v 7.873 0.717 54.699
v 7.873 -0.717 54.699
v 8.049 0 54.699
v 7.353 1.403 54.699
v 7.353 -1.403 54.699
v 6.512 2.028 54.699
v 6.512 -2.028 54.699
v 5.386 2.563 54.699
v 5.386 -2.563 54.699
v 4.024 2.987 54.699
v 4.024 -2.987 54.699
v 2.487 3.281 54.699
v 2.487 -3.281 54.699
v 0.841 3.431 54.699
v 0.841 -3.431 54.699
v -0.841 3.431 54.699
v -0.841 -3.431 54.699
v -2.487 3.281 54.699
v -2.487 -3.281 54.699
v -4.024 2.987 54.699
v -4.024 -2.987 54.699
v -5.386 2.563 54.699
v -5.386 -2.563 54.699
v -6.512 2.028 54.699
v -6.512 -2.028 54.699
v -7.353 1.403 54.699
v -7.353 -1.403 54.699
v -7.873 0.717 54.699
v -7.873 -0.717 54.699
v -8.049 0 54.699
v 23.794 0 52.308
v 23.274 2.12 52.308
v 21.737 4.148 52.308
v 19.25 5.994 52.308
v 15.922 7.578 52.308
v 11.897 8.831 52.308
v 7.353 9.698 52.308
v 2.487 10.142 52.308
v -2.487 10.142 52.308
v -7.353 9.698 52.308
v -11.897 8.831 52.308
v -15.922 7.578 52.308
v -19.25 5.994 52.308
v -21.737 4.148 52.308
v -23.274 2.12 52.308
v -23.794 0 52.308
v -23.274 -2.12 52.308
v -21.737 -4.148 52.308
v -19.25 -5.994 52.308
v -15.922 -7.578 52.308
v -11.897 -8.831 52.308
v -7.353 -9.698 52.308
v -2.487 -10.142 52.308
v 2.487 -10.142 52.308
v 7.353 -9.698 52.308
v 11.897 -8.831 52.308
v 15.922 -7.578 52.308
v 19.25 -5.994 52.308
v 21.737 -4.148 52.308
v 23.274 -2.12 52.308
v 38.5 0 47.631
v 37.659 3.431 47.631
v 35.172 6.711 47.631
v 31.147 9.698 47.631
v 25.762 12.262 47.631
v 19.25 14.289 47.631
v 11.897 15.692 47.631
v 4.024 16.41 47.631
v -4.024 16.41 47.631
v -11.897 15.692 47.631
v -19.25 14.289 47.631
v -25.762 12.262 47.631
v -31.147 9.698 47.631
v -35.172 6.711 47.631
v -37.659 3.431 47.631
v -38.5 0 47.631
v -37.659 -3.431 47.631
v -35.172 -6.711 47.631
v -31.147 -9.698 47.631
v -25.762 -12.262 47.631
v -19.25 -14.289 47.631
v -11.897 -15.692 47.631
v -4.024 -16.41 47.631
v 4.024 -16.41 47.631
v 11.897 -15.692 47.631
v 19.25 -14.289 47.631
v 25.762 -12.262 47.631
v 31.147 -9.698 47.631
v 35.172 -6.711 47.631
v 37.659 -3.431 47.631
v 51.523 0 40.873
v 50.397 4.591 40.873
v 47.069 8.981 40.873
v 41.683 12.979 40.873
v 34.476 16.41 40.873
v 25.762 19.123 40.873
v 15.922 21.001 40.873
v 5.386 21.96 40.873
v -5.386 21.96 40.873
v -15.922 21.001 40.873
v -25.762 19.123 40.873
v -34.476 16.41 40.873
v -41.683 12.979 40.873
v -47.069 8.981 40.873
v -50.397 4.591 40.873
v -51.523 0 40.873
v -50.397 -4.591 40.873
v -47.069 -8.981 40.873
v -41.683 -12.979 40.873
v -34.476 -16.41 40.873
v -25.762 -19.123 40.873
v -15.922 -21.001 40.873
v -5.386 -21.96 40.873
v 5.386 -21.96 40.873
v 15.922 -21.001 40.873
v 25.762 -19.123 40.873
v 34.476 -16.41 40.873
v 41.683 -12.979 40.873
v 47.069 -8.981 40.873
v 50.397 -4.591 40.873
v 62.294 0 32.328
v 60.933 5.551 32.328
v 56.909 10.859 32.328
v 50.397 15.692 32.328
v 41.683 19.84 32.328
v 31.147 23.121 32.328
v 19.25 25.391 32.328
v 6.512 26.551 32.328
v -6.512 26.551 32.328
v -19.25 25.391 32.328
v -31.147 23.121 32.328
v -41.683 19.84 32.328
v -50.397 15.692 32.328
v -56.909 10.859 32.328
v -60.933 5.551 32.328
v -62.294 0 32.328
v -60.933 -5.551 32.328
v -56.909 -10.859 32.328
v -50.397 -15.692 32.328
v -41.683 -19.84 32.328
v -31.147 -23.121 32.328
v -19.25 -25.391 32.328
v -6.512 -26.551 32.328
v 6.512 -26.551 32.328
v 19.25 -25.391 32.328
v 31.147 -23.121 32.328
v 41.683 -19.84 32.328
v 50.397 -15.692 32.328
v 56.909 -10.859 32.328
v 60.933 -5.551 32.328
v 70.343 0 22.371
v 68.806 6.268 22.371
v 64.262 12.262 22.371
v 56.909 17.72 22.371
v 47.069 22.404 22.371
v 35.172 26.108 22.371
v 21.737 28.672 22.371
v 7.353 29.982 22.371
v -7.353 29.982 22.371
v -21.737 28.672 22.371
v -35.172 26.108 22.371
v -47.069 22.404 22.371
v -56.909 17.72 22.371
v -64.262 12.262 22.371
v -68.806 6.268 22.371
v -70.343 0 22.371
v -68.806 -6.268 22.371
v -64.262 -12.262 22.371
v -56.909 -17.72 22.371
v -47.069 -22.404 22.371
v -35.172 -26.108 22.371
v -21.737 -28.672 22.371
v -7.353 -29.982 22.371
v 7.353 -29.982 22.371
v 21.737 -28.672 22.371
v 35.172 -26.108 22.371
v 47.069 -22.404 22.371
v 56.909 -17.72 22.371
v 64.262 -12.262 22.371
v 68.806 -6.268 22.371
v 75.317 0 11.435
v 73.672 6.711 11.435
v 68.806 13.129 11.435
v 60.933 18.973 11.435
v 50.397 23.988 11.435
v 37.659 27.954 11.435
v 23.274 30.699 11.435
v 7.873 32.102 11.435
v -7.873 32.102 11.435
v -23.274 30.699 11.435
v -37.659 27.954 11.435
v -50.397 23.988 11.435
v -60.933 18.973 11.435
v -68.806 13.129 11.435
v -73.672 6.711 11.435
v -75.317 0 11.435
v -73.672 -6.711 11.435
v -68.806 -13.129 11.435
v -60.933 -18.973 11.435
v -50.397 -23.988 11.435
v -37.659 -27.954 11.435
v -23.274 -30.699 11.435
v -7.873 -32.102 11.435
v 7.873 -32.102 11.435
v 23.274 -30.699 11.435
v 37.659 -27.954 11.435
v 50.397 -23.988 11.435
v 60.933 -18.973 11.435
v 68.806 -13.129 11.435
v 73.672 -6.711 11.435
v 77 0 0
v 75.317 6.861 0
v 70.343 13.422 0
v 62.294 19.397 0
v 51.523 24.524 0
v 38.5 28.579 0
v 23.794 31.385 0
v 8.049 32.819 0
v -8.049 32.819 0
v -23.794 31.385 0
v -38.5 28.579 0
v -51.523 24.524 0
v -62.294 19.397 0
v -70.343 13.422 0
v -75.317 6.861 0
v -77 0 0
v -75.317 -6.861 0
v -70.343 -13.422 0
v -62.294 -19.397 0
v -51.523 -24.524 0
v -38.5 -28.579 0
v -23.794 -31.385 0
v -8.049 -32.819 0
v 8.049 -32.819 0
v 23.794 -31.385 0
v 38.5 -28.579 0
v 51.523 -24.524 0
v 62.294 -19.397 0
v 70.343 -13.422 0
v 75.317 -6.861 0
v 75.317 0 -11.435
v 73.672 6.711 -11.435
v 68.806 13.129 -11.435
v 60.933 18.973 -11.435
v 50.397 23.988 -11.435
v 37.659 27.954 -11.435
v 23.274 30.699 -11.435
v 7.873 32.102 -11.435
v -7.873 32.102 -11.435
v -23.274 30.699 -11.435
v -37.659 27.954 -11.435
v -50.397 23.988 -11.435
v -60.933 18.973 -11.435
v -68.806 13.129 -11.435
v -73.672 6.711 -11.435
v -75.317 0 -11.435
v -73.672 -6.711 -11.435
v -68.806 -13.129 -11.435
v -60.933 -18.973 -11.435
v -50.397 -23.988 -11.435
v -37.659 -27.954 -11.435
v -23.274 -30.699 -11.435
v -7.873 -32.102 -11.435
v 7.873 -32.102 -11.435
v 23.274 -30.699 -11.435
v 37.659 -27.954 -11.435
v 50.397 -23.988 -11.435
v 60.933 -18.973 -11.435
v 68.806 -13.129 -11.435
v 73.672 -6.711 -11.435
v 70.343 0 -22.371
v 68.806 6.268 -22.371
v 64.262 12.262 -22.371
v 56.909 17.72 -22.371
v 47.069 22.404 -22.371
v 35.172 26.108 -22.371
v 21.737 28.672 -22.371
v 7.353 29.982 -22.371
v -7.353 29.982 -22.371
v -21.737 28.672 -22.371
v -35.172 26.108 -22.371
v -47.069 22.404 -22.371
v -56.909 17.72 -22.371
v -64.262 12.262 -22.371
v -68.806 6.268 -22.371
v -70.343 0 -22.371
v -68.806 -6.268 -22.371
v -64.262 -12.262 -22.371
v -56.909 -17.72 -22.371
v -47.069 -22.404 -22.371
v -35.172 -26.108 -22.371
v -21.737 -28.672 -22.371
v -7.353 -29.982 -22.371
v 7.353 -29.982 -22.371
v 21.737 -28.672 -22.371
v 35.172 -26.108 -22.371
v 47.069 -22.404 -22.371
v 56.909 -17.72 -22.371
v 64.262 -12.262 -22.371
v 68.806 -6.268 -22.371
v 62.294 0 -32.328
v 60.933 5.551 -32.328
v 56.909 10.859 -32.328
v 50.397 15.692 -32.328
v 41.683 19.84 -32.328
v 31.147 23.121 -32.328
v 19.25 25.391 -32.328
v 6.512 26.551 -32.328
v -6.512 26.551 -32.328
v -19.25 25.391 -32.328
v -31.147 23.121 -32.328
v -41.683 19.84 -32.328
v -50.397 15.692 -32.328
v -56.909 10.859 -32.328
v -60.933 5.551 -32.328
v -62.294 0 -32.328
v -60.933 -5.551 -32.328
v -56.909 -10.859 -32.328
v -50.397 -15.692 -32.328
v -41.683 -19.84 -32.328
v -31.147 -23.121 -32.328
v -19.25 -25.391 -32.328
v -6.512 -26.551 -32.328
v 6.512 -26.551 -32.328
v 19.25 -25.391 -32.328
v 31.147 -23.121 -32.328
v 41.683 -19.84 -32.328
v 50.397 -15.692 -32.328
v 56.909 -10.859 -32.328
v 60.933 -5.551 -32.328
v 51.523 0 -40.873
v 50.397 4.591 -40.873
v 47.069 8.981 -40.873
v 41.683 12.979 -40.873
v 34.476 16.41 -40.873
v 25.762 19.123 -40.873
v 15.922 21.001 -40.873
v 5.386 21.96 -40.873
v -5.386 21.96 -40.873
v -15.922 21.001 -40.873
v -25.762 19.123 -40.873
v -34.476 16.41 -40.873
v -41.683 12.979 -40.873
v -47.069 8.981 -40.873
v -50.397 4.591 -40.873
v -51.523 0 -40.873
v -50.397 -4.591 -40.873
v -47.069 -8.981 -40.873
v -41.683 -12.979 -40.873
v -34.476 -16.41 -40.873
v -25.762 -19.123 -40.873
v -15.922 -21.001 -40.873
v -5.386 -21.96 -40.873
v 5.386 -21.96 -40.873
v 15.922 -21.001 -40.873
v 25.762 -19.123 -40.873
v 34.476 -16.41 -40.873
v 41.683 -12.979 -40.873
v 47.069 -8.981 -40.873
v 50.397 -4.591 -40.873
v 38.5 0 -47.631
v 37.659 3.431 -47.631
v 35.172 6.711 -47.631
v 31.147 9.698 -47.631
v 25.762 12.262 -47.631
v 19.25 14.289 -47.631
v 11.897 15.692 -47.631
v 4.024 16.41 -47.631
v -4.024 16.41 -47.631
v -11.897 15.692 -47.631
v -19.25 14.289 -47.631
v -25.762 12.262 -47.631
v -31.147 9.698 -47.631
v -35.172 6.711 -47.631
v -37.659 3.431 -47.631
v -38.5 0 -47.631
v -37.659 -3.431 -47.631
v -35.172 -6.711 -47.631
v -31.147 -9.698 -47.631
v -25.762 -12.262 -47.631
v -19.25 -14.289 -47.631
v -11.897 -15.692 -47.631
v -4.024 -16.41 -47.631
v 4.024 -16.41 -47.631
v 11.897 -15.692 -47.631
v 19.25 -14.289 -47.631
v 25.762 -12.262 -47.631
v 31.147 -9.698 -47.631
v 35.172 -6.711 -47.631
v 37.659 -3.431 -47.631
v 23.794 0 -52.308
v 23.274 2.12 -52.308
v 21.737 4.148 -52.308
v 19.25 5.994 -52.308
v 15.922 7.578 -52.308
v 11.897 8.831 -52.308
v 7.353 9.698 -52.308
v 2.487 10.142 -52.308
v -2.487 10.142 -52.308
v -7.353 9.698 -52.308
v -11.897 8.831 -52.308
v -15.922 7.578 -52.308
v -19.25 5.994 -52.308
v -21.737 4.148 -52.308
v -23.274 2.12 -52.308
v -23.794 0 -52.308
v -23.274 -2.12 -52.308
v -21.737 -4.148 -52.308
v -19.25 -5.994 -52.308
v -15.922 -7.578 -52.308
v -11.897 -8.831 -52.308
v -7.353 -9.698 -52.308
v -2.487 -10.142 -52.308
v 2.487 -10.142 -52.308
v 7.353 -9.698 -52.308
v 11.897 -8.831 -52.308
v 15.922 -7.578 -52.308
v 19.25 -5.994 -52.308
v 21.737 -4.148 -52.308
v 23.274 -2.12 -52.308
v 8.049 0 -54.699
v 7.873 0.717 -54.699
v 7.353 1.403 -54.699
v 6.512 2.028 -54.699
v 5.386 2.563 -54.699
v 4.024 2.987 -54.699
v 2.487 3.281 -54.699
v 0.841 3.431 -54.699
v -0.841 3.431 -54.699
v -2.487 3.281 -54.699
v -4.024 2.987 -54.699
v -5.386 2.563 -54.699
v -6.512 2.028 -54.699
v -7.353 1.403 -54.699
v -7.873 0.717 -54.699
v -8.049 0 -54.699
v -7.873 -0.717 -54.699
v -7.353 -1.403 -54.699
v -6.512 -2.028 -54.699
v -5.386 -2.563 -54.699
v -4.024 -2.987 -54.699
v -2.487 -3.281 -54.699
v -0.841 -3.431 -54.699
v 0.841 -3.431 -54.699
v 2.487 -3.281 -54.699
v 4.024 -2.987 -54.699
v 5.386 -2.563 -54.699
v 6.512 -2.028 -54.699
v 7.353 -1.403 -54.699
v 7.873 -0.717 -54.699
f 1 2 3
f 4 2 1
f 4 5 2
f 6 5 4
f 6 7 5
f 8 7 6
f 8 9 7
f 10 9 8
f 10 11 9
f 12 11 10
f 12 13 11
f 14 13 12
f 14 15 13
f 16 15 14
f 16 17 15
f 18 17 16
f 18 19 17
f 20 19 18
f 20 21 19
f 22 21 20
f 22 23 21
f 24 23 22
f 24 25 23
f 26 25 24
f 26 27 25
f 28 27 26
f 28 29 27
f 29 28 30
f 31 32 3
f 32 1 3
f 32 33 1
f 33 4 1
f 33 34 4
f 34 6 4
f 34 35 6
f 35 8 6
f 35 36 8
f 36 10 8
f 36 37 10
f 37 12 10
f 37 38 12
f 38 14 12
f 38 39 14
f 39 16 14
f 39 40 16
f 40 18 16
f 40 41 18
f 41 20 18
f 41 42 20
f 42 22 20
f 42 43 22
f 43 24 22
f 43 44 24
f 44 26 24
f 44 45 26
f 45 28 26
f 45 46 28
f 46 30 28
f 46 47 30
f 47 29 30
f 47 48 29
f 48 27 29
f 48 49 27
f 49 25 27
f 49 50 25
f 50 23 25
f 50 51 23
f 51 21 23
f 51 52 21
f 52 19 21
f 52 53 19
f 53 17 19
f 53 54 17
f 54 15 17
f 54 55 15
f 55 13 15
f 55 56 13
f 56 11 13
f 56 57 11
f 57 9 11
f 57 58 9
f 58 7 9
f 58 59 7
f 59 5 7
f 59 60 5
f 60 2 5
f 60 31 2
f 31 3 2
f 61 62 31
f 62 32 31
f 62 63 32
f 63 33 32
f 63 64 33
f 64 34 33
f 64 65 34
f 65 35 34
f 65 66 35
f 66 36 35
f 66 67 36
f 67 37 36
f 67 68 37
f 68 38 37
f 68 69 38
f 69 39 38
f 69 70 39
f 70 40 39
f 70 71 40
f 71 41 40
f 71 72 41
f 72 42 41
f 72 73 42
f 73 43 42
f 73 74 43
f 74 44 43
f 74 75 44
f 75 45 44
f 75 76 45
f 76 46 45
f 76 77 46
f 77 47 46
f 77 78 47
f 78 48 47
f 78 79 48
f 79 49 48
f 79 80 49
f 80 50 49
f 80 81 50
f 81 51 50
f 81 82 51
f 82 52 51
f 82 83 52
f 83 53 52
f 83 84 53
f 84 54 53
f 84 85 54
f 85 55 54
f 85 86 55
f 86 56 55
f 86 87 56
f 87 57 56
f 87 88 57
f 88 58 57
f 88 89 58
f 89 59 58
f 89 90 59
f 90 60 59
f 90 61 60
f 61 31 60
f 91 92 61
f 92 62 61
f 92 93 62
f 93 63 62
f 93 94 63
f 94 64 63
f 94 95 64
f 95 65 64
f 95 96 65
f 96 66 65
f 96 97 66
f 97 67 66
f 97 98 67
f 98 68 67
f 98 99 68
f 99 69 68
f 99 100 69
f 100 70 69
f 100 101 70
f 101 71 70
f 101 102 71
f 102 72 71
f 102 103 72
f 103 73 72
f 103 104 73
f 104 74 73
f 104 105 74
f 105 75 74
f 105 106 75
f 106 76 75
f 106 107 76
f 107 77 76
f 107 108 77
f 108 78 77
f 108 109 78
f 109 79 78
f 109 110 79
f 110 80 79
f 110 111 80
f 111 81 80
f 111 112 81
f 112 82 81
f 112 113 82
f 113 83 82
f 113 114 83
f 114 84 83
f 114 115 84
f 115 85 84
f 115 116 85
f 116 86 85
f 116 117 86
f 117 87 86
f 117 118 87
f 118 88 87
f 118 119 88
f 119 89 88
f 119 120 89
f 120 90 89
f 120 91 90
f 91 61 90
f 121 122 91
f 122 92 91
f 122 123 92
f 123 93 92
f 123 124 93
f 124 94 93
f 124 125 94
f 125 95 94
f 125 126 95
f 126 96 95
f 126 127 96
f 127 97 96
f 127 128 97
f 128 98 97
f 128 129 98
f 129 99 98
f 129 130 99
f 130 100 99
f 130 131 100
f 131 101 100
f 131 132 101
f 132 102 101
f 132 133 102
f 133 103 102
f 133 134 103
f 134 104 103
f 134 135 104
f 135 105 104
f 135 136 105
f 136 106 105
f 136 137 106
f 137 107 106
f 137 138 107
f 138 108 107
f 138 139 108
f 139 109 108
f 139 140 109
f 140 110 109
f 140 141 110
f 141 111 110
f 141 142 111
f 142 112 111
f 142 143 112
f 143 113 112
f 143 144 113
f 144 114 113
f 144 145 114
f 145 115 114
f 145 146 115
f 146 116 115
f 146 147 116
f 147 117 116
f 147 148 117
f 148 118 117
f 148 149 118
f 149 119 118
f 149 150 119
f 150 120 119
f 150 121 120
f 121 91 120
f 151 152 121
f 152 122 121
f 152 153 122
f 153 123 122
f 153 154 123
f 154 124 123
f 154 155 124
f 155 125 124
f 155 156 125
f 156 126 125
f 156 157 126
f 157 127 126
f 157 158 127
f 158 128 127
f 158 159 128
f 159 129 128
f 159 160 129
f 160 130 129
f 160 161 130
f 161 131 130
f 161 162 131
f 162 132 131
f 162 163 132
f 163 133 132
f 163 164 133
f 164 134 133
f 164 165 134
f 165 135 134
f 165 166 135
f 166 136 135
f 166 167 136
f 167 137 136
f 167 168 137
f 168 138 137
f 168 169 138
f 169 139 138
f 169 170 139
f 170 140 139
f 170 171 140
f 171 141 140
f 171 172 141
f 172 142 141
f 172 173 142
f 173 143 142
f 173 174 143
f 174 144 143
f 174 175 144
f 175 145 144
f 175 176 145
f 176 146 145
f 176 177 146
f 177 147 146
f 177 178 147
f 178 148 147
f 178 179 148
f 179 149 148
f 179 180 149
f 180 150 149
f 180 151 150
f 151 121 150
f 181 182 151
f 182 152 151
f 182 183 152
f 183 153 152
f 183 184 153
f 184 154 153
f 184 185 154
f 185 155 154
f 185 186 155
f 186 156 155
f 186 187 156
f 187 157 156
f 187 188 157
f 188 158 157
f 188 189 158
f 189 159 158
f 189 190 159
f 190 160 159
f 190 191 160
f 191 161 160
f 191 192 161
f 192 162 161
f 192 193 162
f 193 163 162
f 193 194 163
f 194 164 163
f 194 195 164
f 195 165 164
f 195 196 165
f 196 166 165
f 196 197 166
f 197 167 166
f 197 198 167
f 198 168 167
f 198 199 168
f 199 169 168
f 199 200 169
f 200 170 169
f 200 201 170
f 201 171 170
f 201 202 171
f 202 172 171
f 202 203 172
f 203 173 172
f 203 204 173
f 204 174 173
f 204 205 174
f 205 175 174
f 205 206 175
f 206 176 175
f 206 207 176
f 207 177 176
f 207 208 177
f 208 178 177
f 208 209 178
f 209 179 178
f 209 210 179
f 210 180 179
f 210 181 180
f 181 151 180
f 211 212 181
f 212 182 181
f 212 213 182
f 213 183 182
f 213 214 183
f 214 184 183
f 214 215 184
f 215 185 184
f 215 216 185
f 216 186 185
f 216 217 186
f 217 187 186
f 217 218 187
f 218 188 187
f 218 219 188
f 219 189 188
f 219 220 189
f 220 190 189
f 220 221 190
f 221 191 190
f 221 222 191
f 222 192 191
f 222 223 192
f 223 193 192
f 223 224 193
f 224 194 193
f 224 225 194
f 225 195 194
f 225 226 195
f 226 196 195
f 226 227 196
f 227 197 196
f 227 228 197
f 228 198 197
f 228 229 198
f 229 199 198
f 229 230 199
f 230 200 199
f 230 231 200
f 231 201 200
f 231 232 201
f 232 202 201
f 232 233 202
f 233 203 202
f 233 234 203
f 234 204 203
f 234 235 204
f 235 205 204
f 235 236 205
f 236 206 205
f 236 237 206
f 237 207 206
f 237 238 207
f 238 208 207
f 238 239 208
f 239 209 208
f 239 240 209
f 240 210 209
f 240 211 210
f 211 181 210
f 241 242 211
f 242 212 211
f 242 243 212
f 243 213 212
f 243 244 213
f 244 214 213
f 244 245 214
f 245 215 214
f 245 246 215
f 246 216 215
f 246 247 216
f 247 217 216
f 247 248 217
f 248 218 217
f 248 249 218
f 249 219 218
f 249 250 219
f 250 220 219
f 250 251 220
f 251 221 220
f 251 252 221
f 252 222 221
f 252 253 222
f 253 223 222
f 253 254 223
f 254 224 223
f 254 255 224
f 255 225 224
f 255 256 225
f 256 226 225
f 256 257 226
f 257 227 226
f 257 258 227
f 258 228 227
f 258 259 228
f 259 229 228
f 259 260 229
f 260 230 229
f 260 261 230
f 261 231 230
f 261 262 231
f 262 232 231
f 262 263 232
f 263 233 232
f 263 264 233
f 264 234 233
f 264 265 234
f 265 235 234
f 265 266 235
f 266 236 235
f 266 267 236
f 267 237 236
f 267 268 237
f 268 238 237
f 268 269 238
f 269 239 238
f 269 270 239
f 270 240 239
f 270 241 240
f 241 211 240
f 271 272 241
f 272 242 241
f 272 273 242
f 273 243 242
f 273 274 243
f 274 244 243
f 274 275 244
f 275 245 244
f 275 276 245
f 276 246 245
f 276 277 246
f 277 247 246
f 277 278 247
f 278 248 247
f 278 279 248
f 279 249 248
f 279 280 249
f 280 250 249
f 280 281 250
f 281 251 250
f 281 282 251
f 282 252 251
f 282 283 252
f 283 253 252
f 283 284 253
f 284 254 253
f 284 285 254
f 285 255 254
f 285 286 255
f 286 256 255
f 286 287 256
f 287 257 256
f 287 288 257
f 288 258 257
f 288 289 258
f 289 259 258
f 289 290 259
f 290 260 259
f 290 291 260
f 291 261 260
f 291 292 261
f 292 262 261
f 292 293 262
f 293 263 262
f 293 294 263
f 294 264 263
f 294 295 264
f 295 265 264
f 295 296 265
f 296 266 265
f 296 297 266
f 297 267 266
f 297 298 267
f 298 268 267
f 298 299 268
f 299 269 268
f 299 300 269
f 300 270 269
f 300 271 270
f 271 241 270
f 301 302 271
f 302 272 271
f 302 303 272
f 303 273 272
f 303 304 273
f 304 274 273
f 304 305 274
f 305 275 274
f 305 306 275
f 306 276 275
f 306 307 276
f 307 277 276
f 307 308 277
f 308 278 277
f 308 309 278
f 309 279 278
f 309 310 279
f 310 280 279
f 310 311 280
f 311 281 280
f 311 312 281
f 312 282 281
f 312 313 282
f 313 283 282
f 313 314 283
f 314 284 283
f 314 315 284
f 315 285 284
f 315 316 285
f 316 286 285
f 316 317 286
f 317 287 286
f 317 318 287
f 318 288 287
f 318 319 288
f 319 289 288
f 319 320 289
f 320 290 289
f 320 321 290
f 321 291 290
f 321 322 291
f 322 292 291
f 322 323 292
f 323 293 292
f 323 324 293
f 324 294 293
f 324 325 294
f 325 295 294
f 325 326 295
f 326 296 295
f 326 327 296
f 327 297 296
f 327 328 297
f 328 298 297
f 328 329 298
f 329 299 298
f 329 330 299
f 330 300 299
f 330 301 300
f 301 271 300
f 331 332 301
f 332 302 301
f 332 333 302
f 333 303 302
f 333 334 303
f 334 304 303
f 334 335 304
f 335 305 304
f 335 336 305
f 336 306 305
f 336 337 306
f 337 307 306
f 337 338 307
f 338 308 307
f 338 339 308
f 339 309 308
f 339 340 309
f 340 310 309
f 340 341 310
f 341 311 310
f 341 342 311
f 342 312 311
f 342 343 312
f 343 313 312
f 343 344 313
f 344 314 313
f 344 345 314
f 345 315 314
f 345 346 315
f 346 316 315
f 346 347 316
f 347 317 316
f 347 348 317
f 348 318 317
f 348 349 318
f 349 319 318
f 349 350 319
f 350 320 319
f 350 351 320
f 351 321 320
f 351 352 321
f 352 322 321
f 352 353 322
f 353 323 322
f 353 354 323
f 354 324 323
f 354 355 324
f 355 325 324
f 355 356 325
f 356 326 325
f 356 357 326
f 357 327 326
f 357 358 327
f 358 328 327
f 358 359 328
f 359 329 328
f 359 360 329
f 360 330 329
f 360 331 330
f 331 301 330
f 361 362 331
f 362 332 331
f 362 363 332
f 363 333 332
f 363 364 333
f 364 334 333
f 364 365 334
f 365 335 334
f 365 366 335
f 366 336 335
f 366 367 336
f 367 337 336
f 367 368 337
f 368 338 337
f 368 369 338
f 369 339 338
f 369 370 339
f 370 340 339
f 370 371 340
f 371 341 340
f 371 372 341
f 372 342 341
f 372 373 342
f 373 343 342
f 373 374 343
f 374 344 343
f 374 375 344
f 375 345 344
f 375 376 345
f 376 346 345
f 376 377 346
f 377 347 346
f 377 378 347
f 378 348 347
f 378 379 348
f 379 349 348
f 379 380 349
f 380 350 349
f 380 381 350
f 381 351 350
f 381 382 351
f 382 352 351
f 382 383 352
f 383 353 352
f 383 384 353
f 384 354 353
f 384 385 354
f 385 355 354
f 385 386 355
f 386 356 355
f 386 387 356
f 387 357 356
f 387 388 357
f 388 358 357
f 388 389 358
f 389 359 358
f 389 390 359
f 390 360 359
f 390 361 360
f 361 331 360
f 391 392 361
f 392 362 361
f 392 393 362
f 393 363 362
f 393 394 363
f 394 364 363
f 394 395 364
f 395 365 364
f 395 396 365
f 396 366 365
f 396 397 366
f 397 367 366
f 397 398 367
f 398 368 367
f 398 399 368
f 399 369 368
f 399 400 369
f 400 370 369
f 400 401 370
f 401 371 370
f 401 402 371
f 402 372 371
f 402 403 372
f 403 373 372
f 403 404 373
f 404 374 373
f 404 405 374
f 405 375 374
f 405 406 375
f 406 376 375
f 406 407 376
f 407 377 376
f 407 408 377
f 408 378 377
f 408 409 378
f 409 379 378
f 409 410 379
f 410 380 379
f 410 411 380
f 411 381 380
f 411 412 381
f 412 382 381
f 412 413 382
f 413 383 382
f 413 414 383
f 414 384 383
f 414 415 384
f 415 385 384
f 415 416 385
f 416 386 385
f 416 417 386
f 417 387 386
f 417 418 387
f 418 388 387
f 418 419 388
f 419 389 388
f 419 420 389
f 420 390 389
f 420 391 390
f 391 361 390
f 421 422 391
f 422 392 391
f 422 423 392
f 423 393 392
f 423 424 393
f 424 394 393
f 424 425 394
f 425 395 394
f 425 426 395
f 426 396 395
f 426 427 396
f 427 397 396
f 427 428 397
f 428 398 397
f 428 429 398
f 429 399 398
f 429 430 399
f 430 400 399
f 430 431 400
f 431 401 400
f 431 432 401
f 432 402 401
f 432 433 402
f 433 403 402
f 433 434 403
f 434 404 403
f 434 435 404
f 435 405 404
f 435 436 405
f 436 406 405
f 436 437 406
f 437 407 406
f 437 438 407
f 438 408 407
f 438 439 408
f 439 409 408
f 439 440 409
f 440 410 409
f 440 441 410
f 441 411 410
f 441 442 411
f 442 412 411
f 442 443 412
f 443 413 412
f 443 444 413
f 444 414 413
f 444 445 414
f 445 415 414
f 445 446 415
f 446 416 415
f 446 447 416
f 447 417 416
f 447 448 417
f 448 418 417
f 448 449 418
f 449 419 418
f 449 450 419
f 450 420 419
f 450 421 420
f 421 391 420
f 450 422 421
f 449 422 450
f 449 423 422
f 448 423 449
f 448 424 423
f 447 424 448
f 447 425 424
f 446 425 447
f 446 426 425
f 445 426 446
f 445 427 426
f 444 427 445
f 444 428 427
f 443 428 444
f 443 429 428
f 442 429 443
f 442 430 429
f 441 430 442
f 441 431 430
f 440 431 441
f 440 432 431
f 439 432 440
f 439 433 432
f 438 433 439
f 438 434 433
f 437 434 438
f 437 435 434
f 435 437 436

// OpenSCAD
// Generated by SolidPython 1.0.1 on 2020-07-29 00:46:47


scale(v = [7, 3, 5]) {
	sphere(r = 11);
}
/***********************************************
*********      SolidPython code:      **********
************************************************
 
# import packages: SolidPython
from solid import *
from solid.utils import *
from itertools import chain, combinations, permutations


class Resize:

    def __init__(self, scad_file):
        self.scad_file = scad_file
        #self.scad_file = import_scad(scad_file)
        # cone/cylinder param:
        self.r1 = 0
        self.r2 = 0
        self.h = 0
        # rectangular prism param:
        self.w = 0
        self.l = 0
        # ellipse param:
        self.r = 0

    # import OpenScad code (file name corresponds to shape)


    # classify shape + parameters
    def assign(self, param1, param2, param3):
        if self.scad_file == 'cone.scad':
            self.r1 = param1
            self.r2 = param2
            self.h = param3
        elif self.scad_file == 'cylinder.scad':
            self.r1 = param1
            self.r2 = param2
            self.h = param3
        elif self.scad_file == 'rectangularPrism.scad':
            self.h = param1
            self.l = param2
            self.w = param3
        else:
            self.r = param1
            self.h = param2

    # resize parameters
    def iterate(self):
        x = range(3, 20, 2)
        i = 1
        if self.scad_file == 'cone.scad':
            tempList = list(permutations(x, 2))
            for temp in tempList:
                param1 = temp[0]
                param2 = temp[1]
                filepath = 'produced_scad_files/' + 'cone' + str(param1) + '_' + str(param2) + '_' + '.scad'
                scad_render_to_file(cylinder(h=param1, r1=param2, r2=0), filepath)

        elif self.scad_file == 'cylinder.scad':
            tempList = list(permutations(x, 3))
            for temp in tempList:
                param1 = temp[0]
                param2 = temp[1]
                filepath = 'produced_scad_files/' + 'cylinder' + str(param1) + '_' + str(param2) + '_' + '.scad'
                scad_render_to_file(cylinder(h=param1, r1=param2, r2=param2), filepath)

        elif self.scad_file == 'rectangularPrism.scad':
            tempList = list(permutations(x, 3))
            for temp in tempList:
                param1 = temp[0]
                param2 = temp[1]
                param3 = temp[2]
                filepath = 'produced_scad_files/' + 'rectangularPrism' + str(param1) + '_' + str(param2) + '_' + str(
                    param3) + '.scad'
                scad_render_to_file(cube(size=(param1, param2, param3)), filepath)

        elif self.scad_file == 'ellipse.scad':
            tempList = list(permutations(x, 4))
            for temp in tempList:
                param1 = temp[0]
                param2 = temp[1]
                param3 = temp[2]
                param4 = temp[3]
                filepath = 'produced_scad_files/' + 'ellipse' + str(param1) + '_' + str(param2) + '_' + str(param3) + '_' + str(param4) + '.scad'
                scad_render_to_file(scale([param1, param2, param3])(sphere(r=param4)), filepath)

    def render_to_scadfile(self):
        scad_render_to_file(scad, 'example.scad') 
 
************************************************/
